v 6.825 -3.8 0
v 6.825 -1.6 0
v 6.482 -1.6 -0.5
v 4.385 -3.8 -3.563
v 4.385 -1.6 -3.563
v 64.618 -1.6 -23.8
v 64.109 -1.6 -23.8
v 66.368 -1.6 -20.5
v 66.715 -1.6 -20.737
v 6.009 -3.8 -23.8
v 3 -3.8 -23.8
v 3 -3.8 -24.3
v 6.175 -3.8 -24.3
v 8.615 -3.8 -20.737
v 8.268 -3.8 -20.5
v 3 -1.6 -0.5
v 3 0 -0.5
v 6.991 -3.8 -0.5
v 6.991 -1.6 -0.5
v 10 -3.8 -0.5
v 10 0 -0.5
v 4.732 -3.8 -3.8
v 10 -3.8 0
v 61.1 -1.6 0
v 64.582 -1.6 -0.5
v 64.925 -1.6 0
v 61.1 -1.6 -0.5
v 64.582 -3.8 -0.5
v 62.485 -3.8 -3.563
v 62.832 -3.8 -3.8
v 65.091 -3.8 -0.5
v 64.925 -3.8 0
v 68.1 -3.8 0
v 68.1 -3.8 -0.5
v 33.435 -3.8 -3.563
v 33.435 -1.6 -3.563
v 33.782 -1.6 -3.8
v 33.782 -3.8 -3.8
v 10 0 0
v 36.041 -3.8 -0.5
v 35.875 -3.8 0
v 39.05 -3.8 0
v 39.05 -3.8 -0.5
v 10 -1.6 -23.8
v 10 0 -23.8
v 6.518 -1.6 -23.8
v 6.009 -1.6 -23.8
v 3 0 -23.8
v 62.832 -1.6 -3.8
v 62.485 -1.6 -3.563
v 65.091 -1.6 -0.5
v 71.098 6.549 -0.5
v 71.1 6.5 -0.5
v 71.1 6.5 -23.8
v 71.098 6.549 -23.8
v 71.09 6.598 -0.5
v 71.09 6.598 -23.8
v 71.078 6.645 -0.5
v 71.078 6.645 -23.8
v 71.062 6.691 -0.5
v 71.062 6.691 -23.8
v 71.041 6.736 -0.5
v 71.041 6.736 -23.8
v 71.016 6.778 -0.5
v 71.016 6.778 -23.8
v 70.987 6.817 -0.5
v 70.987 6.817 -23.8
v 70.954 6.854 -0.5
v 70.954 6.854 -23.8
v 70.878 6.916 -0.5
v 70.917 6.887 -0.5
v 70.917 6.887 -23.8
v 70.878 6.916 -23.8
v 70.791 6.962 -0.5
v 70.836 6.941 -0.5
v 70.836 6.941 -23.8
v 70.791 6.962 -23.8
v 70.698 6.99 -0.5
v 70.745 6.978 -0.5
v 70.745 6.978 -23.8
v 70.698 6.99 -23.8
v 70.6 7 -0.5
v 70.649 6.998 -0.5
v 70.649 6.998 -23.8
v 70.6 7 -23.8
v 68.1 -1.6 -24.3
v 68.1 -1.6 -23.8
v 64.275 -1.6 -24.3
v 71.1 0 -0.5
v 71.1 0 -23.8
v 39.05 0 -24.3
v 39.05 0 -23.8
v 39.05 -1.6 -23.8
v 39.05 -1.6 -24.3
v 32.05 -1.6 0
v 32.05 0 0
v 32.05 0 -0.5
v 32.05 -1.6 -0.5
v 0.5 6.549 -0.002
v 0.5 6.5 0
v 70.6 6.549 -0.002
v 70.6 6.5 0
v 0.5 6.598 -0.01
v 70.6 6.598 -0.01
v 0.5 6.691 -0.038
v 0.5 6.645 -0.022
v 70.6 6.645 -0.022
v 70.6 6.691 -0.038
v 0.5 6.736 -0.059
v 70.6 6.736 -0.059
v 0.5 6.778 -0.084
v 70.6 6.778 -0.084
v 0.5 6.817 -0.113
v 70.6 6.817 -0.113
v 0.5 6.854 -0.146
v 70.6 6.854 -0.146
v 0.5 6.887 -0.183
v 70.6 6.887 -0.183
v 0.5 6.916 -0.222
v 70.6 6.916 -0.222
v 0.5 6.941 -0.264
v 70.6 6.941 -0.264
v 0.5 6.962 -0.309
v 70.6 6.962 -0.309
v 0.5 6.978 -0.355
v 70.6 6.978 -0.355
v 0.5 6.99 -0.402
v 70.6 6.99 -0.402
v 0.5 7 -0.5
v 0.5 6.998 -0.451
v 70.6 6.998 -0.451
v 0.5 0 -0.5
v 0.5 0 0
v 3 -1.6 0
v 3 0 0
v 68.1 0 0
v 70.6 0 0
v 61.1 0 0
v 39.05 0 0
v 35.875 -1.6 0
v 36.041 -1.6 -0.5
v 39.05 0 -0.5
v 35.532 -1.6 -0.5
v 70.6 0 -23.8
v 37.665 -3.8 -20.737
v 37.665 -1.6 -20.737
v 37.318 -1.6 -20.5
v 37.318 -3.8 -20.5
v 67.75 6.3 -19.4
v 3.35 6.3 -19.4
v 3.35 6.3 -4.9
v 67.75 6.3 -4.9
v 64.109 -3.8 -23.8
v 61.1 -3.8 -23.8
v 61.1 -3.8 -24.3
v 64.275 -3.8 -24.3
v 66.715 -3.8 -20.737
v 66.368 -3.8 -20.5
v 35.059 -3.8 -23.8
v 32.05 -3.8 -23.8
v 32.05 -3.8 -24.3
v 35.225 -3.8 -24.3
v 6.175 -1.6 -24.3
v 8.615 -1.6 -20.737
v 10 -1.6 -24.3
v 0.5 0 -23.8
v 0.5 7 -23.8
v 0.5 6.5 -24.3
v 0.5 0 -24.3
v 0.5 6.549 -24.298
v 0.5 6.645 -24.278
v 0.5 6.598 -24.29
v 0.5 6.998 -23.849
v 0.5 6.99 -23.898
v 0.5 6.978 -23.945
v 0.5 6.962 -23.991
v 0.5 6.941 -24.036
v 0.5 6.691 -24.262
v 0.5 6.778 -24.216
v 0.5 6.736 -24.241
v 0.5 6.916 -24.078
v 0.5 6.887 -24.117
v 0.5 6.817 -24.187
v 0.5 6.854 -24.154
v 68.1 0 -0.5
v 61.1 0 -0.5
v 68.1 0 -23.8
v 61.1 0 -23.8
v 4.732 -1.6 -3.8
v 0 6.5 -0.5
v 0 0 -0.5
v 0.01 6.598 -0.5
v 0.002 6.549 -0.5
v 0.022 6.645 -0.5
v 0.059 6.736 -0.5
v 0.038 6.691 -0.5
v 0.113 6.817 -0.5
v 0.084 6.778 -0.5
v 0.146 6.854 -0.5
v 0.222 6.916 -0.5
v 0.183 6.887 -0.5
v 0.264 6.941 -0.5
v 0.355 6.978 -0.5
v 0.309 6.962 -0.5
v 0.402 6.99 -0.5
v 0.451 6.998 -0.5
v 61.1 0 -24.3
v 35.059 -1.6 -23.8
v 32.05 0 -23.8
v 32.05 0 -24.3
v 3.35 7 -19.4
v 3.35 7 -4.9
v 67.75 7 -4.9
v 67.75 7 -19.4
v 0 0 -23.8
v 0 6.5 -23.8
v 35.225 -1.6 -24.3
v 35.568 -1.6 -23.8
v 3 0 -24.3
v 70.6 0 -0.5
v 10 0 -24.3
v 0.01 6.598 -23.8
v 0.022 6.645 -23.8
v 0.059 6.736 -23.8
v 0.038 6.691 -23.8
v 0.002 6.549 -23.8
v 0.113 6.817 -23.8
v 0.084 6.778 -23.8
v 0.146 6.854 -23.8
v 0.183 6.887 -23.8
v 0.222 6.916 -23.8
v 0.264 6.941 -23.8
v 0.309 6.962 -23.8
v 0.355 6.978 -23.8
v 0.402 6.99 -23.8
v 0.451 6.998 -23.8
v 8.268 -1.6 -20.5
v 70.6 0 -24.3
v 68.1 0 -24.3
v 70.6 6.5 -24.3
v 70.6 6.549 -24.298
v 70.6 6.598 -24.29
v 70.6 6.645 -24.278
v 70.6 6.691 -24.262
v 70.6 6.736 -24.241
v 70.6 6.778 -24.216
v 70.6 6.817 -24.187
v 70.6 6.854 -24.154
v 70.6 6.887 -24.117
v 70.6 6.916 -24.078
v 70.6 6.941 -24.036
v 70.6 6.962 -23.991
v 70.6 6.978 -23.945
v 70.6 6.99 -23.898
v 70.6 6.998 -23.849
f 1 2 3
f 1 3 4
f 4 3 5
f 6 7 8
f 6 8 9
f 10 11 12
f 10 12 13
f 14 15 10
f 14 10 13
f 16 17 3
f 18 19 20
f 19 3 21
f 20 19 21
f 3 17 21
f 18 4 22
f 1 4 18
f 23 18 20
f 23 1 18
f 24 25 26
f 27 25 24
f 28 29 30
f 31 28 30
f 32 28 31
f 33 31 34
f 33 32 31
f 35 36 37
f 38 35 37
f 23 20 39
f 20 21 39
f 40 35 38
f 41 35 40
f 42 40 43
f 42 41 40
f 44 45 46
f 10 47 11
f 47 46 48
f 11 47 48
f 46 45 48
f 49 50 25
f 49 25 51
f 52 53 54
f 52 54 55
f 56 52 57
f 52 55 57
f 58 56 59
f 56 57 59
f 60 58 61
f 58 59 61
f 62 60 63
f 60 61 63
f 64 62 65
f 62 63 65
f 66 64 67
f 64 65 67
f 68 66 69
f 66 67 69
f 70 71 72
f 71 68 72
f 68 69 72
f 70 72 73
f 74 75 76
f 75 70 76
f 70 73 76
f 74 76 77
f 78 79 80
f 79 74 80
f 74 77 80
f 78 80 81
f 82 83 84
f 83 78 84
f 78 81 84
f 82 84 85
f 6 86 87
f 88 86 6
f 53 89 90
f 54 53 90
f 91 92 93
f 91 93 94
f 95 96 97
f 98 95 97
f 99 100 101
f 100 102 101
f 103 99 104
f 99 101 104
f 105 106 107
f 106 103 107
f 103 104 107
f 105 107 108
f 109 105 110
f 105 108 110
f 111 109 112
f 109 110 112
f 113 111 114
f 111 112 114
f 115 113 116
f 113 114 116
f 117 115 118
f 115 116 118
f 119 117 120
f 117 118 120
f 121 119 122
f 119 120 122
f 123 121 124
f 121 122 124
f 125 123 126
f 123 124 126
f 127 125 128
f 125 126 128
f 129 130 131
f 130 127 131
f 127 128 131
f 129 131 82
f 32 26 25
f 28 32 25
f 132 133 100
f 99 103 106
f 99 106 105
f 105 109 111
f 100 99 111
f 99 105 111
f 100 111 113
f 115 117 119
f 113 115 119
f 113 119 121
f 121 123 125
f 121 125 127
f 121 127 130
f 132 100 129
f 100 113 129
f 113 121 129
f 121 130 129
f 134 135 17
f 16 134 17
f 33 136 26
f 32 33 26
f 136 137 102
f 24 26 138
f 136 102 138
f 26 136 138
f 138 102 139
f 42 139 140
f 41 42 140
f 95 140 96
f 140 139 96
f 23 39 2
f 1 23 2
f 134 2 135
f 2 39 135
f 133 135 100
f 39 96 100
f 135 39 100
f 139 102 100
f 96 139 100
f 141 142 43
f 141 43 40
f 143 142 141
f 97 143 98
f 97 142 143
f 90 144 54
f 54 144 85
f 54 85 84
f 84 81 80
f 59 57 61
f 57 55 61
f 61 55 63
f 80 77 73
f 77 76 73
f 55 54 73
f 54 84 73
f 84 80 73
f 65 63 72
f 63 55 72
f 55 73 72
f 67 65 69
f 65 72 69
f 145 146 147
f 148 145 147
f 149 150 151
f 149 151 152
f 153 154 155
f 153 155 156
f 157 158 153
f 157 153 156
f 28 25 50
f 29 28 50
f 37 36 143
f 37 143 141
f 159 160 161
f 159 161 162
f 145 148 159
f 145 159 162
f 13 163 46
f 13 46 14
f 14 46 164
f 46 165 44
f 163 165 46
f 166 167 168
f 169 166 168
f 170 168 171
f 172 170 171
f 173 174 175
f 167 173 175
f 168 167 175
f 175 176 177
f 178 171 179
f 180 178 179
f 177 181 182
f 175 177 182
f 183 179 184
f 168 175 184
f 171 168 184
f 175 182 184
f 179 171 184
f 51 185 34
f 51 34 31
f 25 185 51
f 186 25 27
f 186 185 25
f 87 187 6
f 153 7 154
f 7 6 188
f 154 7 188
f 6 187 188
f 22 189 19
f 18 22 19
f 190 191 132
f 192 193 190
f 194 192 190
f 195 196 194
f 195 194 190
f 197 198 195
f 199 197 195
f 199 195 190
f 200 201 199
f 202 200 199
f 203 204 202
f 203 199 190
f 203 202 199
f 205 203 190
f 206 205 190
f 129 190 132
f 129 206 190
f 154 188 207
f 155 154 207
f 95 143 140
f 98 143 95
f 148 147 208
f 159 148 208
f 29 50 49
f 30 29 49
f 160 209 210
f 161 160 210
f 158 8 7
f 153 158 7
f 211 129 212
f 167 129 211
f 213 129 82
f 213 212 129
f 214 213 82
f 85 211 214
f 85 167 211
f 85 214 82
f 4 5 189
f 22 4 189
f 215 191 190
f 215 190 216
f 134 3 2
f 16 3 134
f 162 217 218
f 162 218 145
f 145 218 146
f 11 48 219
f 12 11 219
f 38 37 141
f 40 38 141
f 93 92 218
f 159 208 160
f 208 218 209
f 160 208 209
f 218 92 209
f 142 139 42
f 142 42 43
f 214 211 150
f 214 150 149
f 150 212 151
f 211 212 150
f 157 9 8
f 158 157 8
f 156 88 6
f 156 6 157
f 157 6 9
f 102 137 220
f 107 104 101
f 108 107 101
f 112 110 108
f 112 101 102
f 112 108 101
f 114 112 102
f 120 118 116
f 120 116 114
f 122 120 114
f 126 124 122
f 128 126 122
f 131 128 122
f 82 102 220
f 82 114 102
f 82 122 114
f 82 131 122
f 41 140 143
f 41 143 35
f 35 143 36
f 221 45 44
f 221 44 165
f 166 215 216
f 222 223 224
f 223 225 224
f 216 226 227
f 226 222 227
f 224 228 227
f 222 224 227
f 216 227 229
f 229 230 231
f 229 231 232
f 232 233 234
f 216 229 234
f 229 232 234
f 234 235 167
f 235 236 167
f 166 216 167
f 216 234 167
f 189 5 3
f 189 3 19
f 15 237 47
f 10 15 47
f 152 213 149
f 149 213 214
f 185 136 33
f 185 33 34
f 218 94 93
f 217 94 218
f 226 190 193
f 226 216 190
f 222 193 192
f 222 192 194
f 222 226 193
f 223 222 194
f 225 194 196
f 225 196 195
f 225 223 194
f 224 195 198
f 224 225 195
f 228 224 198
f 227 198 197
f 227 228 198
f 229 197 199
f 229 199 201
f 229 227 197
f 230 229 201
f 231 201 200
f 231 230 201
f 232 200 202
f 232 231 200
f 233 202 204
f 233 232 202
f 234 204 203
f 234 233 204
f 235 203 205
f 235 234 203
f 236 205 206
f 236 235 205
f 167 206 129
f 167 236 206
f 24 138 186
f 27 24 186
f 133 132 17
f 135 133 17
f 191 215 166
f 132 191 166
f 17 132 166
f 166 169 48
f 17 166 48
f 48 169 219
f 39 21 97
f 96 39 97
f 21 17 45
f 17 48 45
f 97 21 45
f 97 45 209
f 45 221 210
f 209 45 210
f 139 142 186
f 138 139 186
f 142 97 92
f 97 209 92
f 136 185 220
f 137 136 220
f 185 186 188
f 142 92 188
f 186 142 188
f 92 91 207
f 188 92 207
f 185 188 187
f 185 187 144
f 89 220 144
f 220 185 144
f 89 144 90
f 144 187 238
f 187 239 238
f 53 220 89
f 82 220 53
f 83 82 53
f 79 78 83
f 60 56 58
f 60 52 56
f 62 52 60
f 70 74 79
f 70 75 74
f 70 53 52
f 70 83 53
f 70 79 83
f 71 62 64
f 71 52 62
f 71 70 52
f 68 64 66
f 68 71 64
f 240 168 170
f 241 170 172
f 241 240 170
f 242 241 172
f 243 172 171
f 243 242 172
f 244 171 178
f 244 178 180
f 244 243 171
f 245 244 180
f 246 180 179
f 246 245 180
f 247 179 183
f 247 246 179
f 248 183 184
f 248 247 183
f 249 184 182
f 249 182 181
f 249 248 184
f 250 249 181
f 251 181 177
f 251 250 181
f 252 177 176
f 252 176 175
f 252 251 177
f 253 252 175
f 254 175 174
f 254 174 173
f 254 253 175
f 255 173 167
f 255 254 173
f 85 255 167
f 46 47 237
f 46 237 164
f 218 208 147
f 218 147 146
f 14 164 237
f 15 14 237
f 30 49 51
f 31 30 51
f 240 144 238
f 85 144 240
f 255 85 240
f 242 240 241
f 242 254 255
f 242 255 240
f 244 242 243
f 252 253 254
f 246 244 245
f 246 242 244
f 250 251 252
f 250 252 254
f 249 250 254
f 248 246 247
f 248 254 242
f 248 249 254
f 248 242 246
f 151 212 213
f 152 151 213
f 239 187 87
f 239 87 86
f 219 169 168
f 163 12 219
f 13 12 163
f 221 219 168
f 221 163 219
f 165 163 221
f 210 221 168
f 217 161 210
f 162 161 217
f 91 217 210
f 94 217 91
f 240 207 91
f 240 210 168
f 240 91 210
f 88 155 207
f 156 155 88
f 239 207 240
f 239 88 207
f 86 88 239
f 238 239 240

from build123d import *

# Parameters (mm, degrees)
ESQUISSE1_W             = 71.1
ESQUISSE1_H             = 24.3
BOSS_EXTRU_1_DEPTH      = 7
CONG_1_R                = 0.5
ESQUISSE2_W             = 1.653567917
ESQUISSE2_H             = 1.375254205
ESQUISSE2_W_2           = 1.332598991
ESQUISSE2_H_2           = 1.640495544
ESQUISSE2_W_3           = 1.790407611
ESQUISSE2_H_3           = 2.285395674
ENL_V_MAT_EXTRU_1_DEPTH = 7
ESQUISSE3_W             = 64.4
ESQUISSE3_H             = 14.5
ENL_V_MAT_EXTRU_2_DEPTH = 0.7
ESQUISSE4_W             = 7
ESQUISSE4_H             = 0.5
BOSS_EXTRU_2_DEPTH      = 1.6
BOSS_EXTRU_3_DEPTH      = 2.2


with BuildPart() as part:
    # Esquisse1 → Boss.-Extru.1 (new body)
    with BuildSketch(Plane(origin=(0, 0, 0), x_dir=(1, 0, 0), z_dir=(0, 1, 0))):
        with Locations((35.55, 12.15)):
            Rectangle(ESQUISSE1_W, ESQUISSE1_H)
    extrude(amount=BOSS_EXTRU_1_DEPTH)

    # Congé1
    cong_1_edges = [part.edges().sort_by_distance(p)[0] for p in [
        (71.1, 7, -12.15),
        (35.55, 7, -24.3),
        (0, 7, -12.15),
        (35.55, 7, 0),
    ]]
    fillet(cong_1_edges, radius=CONG_1_R)

    # Esquisse2 → Enlèv. mat.-Extru.1 (cut)
    with BuildSketch(Plane(origin=(0, 7, 0), x_dir=(1, 0, 0), z_dir=(0, 1, 0))):
        with Locations((-0.326783959, 24.487627102)):
            Rectangle(ESQUISSE2_W, ESQUISSE2_H)
        with Locations((-0.166299496, -0.320247772)):
            Rectangle(ESQUISSE2_W_2, ESQUISSE2_H_2)
        with Locations((71.495203806, -0.320247772)):
            Rectangle(ESQUISSE2_W_3, ESQUISSE2_H_2)
        with Locations((71.495203806, 24.942697837)):
            Rectangle(ESQUISSE2_W_3, ESQUISSE2_H_3)
    extrude(amount=-ENL_V_MAT_EXTRU_1_DEPTH, mode=Mode.SUBTRACT)

    # Esquisse3 → Enlèv. mat.-Extru.2 (cut)
    with BuildSketch(Plane(origin=(0, 7, 0), x_dir=(1, 0, 0), z_dir=(0, 1, 0))):
        with Locations((35.55, 12.15)):
            Rectangle(ESQUISSE3_W, ESQUISSE3_H)
    extrude(amount=-ENL_V_MAT_EXTRU_2_DEPTH, mode=Mode.SUBTRACT)

    # Esquisse4 → Boss.-Extru.2 (add)
    with BuildSketch(Plane(origin=(0, 0, 0), x_dir=(-1, 0, 0), z_dir=(0, -1, 0))):
        with Locations((-6.5, 0.25)):
            Rectangle(ESQUISSE4_W, ESQUISSE4_H)
        with Locations((-6.5, 24.05)):
            Rectangle(ESQUISSE4_W, ESQUISSE4_H)
        with Locations((-35.55, 0.25)):
            Rectangle(ESQUISSE4_W, ESQUISSE4_H)
        with Locations((-35.55, 24.05)):
            Rectangle(ESQUISSE4_W, ESQUISSE4_H)
        with Locations((-64.6, 0.25)):
            Rectangle(ESQUISSE4_W, ESQUISSE4_H)
        with Locations((-64.6, 24.05)):
            Rectangle(ESQUISSE4_W, ESQUISSE4_H)
    extrude(amount=BOSS_EXTRU_2_DEPTH)

    # Esquisse5 → Boss.-Extru.3 (add)
    with BuildSketch(Plane.XZ.offset(1.6)):
        Polygon((4.385314947, -3.562636494), (4.731995615, -3.8), (6.991422348, -0.5), (10, -0.5), (10, 0), (6.824562261, 0), align=None)
        Polygon((33.435314947, -3.562636494), (33.781995615, -3.8), (36.041422348, -0.5), (39.05, -0.5), (39.05, 0), (35.874562261, 0), align=None)
        Polygon((65.091422348, -0.5), (64.582224877, -0.5), (62.485314947, -3.562636494), (62.831995615, -3.8), align=None)
        Polygon((68.1, -0.5), (68.1, 0), (64.924562261, 0), (64.582224877, -0.5), (65.091422348, -0.5), align=None)
        Polygon((66.714685053, -20.737363506), (66.368004385, -20.5), (64.108577652, -23.8), (61.1, -23.8), (61.1, -24.3), (64.275437739, -24.3), align=None)
        Polygon((8.614685053, -20.737363506), (8.268004385, -20.5), (6.008577652, -23.8), (3, -23.8), (3, -24.3), (6.175437739, -24.3), align=None)
        Polygon((37.664685053, -20.737363506), (37.318004385, -20.5), (35.058577652, -23.8), (32.05, -23.8), (32.05, -24.3), (35.225437739, -24.3), align=None)
    extrude(amount=BOSS_EXTRU_3_DEPTH)


solid = part.part
